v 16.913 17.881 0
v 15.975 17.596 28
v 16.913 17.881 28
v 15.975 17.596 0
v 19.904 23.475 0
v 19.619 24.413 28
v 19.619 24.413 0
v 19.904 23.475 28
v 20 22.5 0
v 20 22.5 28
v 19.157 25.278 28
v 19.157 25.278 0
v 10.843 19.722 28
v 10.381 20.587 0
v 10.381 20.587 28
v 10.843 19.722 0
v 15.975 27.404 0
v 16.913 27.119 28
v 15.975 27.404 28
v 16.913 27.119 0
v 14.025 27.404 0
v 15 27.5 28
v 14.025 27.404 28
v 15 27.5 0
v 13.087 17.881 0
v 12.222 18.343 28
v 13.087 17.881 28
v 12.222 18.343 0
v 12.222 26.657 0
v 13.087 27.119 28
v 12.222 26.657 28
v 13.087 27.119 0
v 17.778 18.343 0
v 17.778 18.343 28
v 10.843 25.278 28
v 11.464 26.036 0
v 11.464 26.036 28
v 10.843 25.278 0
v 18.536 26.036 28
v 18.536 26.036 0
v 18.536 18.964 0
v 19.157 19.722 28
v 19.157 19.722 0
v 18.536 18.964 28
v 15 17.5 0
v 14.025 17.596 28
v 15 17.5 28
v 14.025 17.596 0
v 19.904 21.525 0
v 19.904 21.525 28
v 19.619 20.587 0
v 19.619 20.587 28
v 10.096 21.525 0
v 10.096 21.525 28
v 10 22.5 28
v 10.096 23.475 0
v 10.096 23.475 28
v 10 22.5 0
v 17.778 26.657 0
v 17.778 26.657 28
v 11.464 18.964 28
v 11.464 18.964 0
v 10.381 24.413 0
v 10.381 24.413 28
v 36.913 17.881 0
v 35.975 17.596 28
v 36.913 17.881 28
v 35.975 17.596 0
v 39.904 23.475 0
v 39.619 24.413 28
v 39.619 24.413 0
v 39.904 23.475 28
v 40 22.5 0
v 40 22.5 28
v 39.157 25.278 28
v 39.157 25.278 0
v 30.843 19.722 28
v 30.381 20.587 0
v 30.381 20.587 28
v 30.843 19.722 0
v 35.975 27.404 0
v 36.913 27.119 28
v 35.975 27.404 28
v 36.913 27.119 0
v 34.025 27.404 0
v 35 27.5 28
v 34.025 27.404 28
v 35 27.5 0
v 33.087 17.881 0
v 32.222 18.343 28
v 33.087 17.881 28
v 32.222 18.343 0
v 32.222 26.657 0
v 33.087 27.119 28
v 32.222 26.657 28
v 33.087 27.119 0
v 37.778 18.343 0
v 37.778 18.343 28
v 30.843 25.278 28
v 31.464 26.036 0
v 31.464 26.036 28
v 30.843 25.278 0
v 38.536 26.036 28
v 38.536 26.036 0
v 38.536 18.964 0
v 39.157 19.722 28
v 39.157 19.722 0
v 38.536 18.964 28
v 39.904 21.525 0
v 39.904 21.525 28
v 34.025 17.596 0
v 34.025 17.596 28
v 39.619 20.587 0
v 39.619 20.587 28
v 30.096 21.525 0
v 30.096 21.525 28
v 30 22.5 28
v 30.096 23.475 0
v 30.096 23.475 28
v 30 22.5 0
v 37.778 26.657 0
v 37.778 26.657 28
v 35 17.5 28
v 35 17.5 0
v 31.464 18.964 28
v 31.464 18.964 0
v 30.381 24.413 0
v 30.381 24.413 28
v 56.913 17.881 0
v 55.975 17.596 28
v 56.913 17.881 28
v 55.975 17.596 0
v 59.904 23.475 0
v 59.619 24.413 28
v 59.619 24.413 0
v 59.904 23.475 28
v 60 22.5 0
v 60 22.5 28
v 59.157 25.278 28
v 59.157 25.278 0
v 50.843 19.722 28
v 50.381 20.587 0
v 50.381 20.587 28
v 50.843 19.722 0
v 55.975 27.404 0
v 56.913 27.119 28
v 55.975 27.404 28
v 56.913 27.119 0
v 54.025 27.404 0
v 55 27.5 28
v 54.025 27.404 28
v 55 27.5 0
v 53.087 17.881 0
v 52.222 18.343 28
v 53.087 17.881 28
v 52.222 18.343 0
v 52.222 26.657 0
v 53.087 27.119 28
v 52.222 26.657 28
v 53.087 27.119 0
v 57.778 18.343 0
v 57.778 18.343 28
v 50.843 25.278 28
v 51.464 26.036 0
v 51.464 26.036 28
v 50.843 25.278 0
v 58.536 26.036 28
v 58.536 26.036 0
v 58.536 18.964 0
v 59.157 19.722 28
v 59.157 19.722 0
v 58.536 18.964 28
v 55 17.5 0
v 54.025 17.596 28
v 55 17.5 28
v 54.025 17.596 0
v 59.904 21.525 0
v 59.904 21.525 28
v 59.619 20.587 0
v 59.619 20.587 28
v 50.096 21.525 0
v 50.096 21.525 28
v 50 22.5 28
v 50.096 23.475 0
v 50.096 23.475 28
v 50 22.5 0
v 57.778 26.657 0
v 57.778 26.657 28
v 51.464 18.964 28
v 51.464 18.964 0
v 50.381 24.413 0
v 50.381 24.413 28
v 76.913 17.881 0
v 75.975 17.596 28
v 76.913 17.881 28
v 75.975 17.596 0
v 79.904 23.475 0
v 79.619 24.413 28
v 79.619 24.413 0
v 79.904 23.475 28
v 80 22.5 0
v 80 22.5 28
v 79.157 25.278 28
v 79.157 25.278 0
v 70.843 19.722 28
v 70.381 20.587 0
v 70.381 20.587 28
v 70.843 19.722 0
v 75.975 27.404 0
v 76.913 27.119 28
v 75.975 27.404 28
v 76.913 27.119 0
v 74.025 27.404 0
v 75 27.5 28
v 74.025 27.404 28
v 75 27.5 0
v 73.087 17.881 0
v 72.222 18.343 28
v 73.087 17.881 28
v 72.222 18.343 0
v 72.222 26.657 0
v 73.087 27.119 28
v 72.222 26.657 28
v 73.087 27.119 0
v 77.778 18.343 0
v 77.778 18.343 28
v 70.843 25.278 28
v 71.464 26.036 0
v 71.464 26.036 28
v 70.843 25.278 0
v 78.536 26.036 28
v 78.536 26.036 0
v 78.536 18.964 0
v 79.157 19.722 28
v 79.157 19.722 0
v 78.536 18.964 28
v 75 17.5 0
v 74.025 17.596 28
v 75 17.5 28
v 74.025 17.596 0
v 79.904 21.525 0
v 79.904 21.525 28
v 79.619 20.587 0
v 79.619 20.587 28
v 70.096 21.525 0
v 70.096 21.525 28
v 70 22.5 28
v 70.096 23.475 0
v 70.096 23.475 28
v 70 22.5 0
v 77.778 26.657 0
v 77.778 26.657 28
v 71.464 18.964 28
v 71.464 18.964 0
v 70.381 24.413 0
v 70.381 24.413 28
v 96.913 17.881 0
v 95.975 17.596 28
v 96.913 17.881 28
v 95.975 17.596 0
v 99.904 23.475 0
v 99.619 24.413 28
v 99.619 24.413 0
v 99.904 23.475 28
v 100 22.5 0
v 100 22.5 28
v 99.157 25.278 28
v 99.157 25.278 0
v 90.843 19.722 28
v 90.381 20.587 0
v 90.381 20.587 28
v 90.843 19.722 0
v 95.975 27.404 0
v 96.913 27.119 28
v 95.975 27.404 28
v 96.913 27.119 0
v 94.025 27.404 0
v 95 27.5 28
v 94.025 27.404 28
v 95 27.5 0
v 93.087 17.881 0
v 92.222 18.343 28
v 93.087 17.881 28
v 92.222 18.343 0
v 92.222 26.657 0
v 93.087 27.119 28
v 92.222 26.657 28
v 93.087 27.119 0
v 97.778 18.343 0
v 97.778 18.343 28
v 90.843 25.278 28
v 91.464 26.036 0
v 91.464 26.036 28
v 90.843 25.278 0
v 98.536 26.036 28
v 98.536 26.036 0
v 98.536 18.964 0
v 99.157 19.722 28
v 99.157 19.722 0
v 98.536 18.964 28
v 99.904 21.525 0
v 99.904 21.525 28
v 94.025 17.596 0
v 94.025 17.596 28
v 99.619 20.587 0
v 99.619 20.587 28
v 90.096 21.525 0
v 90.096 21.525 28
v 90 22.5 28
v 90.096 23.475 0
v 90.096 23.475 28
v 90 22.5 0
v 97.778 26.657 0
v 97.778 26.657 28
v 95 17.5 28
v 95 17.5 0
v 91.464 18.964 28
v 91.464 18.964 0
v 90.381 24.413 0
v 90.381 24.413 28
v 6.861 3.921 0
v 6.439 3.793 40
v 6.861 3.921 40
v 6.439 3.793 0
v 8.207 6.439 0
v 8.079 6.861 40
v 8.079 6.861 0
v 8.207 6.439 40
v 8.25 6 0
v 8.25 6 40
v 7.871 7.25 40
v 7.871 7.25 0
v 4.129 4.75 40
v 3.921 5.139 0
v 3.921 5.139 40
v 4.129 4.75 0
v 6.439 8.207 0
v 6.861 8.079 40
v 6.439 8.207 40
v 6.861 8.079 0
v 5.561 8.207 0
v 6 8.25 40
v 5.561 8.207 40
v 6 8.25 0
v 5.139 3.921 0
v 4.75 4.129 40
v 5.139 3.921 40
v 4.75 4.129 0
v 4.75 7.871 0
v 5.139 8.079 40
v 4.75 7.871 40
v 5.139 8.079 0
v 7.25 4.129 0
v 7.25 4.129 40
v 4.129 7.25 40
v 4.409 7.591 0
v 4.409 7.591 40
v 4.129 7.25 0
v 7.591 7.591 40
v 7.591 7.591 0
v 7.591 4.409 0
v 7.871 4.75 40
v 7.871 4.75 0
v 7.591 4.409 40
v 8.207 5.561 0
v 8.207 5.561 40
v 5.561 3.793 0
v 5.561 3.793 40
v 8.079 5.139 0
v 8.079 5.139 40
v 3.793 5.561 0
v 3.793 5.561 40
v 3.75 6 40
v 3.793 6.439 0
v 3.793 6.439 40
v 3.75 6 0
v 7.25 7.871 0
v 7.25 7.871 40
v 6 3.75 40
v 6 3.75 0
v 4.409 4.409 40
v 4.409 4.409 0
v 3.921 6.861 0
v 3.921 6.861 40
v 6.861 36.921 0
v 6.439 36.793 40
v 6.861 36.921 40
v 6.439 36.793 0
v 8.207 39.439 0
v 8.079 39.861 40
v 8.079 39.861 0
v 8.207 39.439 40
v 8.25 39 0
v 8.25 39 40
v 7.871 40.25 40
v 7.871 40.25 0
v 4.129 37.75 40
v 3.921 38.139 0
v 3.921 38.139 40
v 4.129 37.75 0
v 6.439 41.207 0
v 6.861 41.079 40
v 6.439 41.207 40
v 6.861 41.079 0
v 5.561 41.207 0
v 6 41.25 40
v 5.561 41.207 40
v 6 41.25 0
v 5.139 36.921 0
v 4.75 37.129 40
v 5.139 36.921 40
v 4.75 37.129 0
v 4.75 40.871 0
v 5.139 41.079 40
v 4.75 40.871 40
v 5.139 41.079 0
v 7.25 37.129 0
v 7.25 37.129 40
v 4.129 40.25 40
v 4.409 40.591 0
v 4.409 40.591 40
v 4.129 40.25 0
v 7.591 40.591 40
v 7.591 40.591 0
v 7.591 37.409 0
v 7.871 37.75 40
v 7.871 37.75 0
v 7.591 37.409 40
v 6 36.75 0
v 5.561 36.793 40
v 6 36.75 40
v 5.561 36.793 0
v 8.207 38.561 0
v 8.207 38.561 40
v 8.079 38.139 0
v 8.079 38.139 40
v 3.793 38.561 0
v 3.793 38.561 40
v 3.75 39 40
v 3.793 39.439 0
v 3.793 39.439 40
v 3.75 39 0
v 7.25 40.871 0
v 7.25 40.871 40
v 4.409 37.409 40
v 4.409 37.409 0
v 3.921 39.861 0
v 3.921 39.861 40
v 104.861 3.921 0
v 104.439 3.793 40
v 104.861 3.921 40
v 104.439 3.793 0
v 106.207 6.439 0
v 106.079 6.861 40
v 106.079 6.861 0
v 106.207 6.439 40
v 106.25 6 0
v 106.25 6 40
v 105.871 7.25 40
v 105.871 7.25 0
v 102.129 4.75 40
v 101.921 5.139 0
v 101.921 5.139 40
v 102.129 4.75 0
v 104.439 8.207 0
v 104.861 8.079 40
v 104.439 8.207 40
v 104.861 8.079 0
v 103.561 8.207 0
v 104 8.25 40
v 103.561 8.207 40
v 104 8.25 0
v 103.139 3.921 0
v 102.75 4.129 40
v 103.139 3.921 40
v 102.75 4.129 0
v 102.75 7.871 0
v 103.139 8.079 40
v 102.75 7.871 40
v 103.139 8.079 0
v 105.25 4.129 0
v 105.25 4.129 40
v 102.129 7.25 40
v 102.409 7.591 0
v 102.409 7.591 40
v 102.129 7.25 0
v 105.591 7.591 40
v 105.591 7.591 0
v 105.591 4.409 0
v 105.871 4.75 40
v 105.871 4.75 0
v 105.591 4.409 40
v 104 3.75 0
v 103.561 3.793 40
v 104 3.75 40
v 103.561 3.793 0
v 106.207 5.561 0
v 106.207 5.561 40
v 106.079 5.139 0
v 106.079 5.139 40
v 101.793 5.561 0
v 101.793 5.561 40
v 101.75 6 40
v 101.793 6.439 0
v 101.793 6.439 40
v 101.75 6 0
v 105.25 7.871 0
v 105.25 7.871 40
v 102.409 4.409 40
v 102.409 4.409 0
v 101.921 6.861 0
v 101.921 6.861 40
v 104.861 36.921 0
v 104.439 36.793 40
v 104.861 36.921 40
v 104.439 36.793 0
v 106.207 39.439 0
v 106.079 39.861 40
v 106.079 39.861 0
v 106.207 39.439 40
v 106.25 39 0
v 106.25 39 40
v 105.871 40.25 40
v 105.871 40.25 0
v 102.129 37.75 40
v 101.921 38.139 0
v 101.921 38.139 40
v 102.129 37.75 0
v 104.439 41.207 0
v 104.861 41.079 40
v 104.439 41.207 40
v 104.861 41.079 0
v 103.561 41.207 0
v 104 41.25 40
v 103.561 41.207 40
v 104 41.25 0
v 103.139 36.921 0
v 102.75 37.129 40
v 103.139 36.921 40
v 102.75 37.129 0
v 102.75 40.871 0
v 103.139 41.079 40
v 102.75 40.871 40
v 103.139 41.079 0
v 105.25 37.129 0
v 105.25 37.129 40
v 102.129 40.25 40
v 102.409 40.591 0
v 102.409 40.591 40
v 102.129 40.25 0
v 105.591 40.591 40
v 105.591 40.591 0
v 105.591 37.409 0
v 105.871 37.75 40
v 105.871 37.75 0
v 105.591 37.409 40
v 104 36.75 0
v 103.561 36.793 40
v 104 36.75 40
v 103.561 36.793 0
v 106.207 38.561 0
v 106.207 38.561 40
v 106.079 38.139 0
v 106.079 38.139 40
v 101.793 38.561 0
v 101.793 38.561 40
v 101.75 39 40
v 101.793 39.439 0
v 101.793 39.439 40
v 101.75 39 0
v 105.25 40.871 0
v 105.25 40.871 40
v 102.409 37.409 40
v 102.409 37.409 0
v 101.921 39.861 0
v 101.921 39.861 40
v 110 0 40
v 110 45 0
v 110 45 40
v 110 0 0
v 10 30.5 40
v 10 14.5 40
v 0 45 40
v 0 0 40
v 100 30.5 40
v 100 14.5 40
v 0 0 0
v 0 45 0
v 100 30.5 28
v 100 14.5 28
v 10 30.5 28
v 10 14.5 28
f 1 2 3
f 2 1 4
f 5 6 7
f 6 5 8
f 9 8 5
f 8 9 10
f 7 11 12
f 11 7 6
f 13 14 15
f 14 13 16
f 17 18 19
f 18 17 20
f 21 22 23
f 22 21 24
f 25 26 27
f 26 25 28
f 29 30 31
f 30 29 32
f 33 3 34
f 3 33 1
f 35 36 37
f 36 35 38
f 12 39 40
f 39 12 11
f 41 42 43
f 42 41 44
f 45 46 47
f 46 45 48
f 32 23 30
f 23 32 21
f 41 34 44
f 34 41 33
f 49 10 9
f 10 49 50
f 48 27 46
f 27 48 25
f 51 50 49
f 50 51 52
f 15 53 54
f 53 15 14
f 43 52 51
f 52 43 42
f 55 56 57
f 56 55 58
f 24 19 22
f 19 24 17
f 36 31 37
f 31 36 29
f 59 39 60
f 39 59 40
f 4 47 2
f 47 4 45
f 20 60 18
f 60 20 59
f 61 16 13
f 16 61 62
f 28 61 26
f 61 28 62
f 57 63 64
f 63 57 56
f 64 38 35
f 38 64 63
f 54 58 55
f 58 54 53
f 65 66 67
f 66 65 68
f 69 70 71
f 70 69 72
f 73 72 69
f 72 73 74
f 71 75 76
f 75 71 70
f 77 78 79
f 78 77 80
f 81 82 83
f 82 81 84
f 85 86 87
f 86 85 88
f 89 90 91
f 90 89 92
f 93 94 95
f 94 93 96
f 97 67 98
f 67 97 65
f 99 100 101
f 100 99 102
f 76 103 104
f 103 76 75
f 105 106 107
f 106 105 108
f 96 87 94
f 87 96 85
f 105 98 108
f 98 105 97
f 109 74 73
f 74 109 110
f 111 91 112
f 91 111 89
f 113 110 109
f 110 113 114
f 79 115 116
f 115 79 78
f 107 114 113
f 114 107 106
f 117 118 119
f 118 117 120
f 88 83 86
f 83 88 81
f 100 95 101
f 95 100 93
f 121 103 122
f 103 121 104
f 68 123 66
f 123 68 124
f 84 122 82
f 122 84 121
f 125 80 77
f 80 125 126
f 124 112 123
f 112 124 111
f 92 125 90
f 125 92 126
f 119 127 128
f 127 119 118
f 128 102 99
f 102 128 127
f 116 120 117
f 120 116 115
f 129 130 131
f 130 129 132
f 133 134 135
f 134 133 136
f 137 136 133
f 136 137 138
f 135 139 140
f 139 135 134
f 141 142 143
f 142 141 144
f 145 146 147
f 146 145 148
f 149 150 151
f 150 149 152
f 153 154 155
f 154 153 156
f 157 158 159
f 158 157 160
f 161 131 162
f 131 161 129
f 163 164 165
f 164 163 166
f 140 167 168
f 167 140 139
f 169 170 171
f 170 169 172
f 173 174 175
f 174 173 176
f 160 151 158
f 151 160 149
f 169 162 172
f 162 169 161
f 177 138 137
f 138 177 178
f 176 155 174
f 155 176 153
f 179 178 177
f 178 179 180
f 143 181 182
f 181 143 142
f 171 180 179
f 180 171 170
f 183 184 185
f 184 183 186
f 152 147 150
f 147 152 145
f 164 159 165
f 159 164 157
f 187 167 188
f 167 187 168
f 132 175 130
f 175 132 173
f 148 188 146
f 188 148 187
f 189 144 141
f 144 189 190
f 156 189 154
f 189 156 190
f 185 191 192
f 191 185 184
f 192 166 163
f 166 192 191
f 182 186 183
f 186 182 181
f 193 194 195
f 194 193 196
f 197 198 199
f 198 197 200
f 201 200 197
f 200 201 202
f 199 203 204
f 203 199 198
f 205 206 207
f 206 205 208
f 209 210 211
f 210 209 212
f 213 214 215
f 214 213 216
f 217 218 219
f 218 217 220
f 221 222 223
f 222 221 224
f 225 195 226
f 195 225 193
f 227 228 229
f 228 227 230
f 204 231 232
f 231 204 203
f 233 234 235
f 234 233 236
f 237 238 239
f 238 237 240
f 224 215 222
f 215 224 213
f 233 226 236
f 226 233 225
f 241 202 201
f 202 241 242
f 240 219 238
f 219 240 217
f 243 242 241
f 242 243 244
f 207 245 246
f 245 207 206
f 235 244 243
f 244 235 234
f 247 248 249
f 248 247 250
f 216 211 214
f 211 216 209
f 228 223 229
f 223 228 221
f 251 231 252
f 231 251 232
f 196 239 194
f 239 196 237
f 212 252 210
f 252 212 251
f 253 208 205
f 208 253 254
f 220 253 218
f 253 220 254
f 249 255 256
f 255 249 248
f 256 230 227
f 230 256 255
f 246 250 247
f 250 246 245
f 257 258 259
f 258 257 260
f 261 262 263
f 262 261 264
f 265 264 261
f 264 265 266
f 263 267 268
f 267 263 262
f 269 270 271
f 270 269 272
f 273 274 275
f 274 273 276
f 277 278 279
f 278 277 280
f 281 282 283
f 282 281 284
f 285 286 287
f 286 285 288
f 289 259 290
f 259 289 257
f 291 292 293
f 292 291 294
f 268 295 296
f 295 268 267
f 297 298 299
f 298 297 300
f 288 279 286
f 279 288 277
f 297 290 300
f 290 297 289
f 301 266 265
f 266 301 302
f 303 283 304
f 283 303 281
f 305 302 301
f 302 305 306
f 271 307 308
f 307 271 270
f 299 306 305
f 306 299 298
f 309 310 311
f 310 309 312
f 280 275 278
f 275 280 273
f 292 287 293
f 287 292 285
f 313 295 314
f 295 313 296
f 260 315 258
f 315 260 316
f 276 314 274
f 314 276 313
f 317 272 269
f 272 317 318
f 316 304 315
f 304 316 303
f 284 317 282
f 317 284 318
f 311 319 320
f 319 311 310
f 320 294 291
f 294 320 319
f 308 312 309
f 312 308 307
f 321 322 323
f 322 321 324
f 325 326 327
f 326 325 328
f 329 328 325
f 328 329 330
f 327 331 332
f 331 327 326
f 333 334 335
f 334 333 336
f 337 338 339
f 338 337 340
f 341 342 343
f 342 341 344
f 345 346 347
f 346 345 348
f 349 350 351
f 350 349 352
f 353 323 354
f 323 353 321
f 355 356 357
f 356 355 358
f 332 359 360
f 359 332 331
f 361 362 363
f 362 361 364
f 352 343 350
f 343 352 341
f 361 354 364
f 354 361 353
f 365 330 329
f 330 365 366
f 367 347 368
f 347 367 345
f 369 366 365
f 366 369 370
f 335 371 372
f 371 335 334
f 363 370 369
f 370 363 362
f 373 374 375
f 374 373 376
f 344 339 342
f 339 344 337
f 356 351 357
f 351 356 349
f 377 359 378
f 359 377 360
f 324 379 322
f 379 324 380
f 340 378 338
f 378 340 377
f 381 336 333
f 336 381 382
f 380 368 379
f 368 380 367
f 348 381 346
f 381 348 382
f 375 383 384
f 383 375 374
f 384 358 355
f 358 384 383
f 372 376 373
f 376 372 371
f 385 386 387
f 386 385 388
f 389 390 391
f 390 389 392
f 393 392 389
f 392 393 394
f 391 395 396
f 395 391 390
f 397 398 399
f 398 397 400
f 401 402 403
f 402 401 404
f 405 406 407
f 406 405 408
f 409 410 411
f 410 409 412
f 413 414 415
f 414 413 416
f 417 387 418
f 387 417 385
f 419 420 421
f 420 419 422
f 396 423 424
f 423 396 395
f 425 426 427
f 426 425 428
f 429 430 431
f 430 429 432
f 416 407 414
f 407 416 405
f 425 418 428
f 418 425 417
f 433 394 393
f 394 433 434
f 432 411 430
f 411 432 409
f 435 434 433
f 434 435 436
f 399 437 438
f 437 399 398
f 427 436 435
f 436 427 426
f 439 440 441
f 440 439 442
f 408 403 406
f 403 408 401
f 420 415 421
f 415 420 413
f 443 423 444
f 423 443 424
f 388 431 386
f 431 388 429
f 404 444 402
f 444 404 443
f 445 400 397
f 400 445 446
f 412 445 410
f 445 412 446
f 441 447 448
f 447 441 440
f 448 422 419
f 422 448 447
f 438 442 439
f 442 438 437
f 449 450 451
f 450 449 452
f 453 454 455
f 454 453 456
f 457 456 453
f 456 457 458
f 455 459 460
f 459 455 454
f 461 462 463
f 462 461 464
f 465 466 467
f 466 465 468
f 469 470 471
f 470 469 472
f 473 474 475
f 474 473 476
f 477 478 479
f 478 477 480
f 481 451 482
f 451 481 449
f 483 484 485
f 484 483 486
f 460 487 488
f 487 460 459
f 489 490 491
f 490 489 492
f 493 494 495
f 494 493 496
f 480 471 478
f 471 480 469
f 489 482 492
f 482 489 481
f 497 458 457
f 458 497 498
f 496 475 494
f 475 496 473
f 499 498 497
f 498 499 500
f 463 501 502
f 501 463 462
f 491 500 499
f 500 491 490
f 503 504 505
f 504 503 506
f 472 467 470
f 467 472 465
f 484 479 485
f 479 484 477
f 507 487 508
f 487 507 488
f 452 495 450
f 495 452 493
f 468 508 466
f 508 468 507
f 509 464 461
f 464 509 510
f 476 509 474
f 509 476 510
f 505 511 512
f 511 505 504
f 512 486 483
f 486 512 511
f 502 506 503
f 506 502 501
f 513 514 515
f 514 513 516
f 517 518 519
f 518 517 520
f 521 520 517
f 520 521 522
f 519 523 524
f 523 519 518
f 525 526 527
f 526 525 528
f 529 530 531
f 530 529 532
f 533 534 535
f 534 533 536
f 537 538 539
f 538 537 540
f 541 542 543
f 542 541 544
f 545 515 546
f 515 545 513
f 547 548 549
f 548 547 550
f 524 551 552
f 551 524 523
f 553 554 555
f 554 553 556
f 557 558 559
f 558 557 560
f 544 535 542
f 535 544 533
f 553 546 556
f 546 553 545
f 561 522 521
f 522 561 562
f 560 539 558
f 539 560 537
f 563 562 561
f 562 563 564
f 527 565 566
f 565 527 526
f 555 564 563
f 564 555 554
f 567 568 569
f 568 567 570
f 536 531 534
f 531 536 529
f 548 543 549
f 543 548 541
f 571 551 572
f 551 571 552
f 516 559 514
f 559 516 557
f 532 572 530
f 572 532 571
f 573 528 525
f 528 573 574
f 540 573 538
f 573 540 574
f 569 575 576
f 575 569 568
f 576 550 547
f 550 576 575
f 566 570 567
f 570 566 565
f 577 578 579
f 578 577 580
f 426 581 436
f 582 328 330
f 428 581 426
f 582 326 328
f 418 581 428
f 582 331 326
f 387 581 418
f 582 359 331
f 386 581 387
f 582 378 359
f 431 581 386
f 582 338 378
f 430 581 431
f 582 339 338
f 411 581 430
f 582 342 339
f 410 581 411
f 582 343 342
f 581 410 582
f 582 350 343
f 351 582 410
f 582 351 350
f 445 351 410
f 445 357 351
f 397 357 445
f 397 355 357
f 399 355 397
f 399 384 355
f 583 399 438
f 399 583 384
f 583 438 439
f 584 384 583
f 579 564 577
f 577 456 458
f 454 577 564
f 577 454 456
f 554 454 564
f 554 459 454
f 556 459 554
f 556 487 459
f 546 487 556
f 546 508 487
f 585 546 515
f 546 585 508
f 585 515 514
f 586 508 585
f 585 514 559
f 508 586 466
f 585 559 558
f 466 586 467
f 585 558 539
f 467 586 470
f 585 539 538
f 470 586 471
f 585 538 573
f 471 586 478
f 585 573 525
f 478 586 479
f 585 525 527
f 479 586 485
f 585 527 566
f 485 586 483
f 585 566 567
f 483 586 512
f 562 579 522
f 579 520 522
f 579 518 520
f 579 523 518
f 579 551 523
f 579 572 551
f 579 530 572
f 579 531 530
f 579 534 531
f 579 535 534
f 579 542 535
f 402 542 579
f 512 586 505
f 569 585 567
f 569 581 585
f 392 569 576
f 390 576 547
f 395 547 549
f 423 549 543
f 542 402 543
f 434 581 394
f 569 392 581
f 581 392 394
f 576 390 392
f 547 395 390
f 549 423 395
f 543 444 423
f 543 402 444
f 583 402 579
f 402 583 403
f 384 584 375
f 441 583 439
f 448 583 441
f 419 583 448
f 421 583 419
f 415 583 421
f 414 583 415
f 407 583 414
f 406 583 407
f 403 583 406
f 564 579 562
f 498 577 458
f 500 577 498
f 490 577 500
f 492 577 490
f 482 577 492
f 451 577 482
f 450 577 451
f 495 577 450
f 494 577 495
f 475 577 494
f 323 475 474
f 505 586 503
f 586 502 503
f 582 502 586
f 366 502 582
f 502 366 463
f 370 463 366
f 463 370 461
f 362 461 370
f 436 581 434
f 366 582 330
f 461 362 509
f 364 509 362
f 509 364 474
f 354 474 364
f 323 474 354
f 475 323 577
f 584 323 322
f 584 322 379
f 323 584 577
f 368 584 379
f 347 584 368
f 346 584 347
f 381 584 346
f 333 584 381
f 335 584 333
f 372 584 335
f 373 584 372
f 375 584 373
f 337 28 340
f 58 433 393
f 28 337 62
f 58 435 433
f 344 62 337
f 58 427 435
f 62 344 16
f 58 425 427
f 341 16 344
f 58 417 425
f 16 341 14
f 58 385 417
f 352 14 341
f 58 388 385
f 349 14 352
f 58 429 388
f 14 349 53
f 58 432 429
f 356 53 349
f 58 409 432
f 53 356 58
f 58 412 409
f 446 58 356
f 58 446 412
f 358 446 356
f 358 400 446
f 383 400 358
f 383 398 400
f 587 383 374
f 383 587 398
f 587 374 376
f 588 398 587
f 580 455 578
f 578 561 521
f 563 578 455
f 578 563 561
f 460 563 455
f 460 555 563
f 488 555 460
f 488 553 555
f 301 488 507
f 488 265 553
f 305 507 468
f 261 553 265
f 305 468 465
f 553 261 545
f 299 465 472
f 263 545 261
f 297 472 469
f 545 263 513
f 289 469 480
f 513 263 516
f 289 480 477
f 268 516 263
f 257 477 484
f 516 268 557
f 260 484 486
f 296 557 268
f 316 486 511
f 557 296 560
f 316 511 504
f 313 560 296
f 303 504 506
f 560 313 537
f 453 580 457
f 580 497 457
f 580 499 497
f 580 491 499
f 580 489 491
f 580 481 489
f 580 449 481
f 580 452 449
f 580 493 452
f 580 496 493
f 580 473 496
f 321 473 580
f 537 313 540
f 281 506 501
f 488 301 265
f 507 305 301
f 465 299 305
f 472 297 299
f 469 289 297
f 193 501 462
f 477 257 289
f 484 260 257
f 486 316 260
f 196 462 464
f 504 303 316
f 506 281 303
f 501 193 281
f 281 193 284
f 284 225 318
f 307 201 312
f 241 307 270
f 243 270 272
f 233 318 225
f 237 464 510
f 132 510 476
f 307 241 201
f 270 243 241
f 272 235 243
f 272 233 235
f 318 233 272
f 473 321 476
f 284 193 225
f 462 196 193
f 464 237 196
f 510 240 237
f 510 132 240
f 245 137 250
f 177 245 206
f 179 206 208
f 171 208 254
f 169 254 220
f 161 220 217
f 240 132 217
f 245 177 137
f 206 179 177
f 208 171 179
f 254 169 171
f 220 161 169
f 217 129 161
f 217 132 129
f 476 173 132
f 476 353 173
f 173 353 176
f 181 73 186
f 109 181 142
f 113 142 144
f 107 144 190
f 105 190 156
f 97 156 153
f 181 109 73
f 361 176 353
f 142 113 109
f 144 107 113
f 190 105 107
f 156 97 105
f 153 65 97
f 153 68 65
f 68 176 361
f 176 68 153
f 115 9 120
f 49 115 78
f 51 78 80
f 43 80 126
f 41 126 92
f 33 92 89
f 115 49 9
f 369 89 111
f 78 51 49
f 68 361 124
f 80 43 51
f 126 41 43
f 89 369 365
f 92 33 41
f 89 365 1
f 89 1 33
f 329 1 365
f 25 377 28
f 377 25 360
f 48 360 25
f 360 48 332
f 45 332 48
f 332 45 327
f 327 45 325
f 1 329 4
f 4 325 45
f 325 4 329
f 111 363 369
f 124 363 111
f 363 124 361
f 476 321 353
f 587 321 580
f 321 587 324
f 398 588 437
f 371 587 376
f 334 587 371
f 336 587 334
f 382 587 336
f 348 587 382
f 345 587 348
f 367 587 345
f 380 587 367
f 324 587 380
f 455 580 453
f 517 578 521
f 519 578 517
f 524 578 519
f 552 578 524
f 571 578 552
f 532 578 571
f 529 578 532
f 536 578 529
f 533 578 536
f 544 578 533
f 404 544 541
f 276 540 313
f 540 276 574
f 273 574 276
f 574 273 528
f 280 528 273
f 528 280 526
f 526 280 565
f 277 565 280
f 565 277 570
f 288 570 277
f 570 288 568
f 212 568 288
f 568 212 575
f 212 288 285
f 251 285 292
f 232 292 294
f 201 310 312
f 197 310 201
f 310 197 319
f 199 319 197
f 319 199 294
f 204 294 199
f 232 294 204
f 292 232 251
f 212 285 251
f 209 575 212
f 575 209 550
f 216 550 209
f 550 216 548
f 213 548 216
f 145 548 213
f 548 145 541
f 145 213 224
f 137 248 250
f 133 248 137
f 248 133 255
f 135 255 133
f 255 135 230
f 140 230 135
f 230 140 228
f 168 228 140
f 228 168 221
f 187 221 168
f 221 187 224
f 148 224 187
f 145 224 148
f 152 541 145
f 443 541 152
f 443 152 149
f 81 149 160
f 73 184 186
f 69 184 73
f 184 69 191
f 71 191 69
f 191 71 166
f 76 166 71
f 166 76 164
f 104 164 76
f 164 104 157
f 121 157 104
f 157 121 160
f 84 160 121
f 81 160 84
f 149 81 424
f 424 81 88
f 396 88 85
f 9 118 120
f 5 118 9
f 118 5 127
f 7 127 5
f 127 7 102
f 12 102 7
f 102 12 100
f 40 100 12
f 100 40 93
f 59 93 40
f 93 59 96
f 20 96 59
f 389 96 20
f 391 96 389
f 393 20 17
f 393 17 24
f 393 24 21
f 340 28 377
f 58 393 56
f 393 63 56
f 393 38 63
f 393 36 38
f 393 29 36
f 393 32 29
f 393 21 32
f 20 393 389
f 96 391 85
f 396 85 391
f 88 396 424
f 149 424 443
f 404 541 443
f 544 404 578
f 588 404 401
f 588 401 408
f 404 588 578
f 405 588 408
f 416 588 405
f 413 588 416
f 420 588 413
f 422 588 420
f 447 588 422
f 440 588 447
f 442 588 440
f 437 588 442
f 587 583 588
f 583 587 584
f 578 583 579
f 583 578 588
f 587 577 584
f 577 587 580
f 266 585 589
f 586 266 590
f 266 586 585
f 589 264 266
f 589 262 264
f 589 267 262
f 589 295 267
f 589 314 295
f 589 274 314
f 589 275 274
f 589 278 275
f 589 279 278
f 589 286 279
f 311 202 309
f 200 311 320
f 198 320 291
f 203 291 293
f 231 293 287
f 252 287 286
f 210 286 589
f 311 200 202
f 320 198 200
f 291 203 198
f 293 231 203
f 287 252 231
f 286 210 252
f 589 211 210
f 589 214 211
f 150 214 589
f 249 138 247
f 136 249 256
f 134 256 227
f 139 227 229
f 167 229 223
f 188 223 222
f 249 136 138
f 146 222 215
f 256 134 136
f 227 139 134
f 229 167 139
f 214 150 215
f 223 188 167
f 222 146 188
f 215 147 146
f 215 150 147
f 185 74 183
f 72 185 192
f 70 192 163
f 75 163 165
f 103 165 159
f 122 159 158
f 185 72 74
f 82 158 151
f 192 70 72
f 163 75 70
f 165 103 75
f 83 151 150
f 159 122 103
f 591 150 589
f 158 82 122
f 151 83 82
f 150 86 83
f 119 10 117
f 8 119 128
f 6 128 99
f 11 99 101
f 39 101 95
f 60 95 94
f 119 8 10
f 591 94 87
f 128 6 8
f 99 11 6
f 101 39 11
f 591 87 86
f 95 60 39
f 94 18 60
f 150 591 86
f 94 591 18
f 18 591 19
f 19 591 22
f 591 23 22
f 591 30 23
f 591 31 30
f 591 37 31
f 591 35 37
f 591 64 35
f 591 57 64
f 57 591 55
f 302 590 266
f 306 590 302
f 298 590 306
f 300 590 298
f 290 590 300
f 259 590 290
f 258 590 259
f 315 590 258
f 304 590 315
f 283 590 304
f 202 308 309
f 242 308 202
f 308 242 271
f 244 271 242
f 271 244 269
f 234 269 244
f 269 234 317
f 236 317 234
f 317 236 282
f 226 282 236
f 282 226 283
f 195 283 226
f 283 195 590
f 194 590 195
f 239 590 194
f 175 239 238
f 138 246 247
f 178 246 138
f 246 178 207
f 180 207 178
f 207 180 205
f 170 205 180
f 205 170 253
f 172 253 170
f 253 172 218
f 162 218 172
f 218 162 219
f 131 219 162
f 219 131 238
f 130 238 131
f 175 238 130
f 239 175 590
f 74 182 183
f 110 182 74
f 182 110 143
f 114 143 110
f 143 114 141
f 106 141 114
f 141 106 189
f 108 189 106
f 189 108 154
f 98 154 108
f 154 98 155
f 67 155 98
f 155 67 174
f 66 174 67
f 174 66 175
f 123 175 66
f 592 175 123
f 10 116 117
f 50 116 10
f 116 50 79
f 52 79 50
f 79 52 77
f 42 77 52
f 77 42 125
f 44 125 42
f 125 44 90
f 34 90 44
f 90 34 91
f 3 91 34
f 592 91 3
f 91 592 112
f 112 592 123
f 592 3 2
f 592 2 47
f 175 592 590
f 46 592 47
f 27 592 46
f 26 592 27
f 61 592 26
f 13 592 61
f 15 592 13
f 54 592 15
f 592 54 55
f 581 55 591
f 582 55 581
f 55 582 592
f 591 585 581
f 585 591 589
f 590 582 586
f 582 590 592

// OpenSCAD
$fn = 32;

// ----------------------------------------------------------------------
// Manifold block: gallery_top manifold
// ----------------------------------------------------------------------

// --- parameters (mm) ---
block_l = 110;            // block length, X
block_w = 45;             // block width, Y
block_h = 40;             // block height, Z
port_d = 10;              // port bore diameter
port_pitch = 20;          // port pitch along X
gallery_d = 16;           // top gallery width, Y
gallery_depth = 12;       // gallery pocket depth
wall_p = 10;              // gallery end wall thickness, X
mnt_d = 4.5;              // mounting hole diameter
mnt_in = 6;               // mounting hole inset from the edges

n_ports = 5;  // ports in the row
port_x0 = (block_l - (n_ports - 1) * port_pitch) / 2;  // first port X

difference() {
  cube([block_l, block_w, block_h]);
  for (i = [0 : n_ports - 1])
    translate([port_x0 + i * port_pitch, block_w / 2, -1])
      cylinder(h = block_h + 2, d = port_d);
  translate([wall_p, block_w / 2 - gallery_d / 2, block_h - gallery_depth])
    cube([block_l - 2 * wall_p, gallery_d, gallery_depth + 1]);
  for (cx = [mnt_in, block_l - mnt_in])
    for (cy = [mnt_in, block_w - mnt_in])
      translate([cx, cy, -1]) cylinder(h = block_h + 2, d = mnt_d);
}
